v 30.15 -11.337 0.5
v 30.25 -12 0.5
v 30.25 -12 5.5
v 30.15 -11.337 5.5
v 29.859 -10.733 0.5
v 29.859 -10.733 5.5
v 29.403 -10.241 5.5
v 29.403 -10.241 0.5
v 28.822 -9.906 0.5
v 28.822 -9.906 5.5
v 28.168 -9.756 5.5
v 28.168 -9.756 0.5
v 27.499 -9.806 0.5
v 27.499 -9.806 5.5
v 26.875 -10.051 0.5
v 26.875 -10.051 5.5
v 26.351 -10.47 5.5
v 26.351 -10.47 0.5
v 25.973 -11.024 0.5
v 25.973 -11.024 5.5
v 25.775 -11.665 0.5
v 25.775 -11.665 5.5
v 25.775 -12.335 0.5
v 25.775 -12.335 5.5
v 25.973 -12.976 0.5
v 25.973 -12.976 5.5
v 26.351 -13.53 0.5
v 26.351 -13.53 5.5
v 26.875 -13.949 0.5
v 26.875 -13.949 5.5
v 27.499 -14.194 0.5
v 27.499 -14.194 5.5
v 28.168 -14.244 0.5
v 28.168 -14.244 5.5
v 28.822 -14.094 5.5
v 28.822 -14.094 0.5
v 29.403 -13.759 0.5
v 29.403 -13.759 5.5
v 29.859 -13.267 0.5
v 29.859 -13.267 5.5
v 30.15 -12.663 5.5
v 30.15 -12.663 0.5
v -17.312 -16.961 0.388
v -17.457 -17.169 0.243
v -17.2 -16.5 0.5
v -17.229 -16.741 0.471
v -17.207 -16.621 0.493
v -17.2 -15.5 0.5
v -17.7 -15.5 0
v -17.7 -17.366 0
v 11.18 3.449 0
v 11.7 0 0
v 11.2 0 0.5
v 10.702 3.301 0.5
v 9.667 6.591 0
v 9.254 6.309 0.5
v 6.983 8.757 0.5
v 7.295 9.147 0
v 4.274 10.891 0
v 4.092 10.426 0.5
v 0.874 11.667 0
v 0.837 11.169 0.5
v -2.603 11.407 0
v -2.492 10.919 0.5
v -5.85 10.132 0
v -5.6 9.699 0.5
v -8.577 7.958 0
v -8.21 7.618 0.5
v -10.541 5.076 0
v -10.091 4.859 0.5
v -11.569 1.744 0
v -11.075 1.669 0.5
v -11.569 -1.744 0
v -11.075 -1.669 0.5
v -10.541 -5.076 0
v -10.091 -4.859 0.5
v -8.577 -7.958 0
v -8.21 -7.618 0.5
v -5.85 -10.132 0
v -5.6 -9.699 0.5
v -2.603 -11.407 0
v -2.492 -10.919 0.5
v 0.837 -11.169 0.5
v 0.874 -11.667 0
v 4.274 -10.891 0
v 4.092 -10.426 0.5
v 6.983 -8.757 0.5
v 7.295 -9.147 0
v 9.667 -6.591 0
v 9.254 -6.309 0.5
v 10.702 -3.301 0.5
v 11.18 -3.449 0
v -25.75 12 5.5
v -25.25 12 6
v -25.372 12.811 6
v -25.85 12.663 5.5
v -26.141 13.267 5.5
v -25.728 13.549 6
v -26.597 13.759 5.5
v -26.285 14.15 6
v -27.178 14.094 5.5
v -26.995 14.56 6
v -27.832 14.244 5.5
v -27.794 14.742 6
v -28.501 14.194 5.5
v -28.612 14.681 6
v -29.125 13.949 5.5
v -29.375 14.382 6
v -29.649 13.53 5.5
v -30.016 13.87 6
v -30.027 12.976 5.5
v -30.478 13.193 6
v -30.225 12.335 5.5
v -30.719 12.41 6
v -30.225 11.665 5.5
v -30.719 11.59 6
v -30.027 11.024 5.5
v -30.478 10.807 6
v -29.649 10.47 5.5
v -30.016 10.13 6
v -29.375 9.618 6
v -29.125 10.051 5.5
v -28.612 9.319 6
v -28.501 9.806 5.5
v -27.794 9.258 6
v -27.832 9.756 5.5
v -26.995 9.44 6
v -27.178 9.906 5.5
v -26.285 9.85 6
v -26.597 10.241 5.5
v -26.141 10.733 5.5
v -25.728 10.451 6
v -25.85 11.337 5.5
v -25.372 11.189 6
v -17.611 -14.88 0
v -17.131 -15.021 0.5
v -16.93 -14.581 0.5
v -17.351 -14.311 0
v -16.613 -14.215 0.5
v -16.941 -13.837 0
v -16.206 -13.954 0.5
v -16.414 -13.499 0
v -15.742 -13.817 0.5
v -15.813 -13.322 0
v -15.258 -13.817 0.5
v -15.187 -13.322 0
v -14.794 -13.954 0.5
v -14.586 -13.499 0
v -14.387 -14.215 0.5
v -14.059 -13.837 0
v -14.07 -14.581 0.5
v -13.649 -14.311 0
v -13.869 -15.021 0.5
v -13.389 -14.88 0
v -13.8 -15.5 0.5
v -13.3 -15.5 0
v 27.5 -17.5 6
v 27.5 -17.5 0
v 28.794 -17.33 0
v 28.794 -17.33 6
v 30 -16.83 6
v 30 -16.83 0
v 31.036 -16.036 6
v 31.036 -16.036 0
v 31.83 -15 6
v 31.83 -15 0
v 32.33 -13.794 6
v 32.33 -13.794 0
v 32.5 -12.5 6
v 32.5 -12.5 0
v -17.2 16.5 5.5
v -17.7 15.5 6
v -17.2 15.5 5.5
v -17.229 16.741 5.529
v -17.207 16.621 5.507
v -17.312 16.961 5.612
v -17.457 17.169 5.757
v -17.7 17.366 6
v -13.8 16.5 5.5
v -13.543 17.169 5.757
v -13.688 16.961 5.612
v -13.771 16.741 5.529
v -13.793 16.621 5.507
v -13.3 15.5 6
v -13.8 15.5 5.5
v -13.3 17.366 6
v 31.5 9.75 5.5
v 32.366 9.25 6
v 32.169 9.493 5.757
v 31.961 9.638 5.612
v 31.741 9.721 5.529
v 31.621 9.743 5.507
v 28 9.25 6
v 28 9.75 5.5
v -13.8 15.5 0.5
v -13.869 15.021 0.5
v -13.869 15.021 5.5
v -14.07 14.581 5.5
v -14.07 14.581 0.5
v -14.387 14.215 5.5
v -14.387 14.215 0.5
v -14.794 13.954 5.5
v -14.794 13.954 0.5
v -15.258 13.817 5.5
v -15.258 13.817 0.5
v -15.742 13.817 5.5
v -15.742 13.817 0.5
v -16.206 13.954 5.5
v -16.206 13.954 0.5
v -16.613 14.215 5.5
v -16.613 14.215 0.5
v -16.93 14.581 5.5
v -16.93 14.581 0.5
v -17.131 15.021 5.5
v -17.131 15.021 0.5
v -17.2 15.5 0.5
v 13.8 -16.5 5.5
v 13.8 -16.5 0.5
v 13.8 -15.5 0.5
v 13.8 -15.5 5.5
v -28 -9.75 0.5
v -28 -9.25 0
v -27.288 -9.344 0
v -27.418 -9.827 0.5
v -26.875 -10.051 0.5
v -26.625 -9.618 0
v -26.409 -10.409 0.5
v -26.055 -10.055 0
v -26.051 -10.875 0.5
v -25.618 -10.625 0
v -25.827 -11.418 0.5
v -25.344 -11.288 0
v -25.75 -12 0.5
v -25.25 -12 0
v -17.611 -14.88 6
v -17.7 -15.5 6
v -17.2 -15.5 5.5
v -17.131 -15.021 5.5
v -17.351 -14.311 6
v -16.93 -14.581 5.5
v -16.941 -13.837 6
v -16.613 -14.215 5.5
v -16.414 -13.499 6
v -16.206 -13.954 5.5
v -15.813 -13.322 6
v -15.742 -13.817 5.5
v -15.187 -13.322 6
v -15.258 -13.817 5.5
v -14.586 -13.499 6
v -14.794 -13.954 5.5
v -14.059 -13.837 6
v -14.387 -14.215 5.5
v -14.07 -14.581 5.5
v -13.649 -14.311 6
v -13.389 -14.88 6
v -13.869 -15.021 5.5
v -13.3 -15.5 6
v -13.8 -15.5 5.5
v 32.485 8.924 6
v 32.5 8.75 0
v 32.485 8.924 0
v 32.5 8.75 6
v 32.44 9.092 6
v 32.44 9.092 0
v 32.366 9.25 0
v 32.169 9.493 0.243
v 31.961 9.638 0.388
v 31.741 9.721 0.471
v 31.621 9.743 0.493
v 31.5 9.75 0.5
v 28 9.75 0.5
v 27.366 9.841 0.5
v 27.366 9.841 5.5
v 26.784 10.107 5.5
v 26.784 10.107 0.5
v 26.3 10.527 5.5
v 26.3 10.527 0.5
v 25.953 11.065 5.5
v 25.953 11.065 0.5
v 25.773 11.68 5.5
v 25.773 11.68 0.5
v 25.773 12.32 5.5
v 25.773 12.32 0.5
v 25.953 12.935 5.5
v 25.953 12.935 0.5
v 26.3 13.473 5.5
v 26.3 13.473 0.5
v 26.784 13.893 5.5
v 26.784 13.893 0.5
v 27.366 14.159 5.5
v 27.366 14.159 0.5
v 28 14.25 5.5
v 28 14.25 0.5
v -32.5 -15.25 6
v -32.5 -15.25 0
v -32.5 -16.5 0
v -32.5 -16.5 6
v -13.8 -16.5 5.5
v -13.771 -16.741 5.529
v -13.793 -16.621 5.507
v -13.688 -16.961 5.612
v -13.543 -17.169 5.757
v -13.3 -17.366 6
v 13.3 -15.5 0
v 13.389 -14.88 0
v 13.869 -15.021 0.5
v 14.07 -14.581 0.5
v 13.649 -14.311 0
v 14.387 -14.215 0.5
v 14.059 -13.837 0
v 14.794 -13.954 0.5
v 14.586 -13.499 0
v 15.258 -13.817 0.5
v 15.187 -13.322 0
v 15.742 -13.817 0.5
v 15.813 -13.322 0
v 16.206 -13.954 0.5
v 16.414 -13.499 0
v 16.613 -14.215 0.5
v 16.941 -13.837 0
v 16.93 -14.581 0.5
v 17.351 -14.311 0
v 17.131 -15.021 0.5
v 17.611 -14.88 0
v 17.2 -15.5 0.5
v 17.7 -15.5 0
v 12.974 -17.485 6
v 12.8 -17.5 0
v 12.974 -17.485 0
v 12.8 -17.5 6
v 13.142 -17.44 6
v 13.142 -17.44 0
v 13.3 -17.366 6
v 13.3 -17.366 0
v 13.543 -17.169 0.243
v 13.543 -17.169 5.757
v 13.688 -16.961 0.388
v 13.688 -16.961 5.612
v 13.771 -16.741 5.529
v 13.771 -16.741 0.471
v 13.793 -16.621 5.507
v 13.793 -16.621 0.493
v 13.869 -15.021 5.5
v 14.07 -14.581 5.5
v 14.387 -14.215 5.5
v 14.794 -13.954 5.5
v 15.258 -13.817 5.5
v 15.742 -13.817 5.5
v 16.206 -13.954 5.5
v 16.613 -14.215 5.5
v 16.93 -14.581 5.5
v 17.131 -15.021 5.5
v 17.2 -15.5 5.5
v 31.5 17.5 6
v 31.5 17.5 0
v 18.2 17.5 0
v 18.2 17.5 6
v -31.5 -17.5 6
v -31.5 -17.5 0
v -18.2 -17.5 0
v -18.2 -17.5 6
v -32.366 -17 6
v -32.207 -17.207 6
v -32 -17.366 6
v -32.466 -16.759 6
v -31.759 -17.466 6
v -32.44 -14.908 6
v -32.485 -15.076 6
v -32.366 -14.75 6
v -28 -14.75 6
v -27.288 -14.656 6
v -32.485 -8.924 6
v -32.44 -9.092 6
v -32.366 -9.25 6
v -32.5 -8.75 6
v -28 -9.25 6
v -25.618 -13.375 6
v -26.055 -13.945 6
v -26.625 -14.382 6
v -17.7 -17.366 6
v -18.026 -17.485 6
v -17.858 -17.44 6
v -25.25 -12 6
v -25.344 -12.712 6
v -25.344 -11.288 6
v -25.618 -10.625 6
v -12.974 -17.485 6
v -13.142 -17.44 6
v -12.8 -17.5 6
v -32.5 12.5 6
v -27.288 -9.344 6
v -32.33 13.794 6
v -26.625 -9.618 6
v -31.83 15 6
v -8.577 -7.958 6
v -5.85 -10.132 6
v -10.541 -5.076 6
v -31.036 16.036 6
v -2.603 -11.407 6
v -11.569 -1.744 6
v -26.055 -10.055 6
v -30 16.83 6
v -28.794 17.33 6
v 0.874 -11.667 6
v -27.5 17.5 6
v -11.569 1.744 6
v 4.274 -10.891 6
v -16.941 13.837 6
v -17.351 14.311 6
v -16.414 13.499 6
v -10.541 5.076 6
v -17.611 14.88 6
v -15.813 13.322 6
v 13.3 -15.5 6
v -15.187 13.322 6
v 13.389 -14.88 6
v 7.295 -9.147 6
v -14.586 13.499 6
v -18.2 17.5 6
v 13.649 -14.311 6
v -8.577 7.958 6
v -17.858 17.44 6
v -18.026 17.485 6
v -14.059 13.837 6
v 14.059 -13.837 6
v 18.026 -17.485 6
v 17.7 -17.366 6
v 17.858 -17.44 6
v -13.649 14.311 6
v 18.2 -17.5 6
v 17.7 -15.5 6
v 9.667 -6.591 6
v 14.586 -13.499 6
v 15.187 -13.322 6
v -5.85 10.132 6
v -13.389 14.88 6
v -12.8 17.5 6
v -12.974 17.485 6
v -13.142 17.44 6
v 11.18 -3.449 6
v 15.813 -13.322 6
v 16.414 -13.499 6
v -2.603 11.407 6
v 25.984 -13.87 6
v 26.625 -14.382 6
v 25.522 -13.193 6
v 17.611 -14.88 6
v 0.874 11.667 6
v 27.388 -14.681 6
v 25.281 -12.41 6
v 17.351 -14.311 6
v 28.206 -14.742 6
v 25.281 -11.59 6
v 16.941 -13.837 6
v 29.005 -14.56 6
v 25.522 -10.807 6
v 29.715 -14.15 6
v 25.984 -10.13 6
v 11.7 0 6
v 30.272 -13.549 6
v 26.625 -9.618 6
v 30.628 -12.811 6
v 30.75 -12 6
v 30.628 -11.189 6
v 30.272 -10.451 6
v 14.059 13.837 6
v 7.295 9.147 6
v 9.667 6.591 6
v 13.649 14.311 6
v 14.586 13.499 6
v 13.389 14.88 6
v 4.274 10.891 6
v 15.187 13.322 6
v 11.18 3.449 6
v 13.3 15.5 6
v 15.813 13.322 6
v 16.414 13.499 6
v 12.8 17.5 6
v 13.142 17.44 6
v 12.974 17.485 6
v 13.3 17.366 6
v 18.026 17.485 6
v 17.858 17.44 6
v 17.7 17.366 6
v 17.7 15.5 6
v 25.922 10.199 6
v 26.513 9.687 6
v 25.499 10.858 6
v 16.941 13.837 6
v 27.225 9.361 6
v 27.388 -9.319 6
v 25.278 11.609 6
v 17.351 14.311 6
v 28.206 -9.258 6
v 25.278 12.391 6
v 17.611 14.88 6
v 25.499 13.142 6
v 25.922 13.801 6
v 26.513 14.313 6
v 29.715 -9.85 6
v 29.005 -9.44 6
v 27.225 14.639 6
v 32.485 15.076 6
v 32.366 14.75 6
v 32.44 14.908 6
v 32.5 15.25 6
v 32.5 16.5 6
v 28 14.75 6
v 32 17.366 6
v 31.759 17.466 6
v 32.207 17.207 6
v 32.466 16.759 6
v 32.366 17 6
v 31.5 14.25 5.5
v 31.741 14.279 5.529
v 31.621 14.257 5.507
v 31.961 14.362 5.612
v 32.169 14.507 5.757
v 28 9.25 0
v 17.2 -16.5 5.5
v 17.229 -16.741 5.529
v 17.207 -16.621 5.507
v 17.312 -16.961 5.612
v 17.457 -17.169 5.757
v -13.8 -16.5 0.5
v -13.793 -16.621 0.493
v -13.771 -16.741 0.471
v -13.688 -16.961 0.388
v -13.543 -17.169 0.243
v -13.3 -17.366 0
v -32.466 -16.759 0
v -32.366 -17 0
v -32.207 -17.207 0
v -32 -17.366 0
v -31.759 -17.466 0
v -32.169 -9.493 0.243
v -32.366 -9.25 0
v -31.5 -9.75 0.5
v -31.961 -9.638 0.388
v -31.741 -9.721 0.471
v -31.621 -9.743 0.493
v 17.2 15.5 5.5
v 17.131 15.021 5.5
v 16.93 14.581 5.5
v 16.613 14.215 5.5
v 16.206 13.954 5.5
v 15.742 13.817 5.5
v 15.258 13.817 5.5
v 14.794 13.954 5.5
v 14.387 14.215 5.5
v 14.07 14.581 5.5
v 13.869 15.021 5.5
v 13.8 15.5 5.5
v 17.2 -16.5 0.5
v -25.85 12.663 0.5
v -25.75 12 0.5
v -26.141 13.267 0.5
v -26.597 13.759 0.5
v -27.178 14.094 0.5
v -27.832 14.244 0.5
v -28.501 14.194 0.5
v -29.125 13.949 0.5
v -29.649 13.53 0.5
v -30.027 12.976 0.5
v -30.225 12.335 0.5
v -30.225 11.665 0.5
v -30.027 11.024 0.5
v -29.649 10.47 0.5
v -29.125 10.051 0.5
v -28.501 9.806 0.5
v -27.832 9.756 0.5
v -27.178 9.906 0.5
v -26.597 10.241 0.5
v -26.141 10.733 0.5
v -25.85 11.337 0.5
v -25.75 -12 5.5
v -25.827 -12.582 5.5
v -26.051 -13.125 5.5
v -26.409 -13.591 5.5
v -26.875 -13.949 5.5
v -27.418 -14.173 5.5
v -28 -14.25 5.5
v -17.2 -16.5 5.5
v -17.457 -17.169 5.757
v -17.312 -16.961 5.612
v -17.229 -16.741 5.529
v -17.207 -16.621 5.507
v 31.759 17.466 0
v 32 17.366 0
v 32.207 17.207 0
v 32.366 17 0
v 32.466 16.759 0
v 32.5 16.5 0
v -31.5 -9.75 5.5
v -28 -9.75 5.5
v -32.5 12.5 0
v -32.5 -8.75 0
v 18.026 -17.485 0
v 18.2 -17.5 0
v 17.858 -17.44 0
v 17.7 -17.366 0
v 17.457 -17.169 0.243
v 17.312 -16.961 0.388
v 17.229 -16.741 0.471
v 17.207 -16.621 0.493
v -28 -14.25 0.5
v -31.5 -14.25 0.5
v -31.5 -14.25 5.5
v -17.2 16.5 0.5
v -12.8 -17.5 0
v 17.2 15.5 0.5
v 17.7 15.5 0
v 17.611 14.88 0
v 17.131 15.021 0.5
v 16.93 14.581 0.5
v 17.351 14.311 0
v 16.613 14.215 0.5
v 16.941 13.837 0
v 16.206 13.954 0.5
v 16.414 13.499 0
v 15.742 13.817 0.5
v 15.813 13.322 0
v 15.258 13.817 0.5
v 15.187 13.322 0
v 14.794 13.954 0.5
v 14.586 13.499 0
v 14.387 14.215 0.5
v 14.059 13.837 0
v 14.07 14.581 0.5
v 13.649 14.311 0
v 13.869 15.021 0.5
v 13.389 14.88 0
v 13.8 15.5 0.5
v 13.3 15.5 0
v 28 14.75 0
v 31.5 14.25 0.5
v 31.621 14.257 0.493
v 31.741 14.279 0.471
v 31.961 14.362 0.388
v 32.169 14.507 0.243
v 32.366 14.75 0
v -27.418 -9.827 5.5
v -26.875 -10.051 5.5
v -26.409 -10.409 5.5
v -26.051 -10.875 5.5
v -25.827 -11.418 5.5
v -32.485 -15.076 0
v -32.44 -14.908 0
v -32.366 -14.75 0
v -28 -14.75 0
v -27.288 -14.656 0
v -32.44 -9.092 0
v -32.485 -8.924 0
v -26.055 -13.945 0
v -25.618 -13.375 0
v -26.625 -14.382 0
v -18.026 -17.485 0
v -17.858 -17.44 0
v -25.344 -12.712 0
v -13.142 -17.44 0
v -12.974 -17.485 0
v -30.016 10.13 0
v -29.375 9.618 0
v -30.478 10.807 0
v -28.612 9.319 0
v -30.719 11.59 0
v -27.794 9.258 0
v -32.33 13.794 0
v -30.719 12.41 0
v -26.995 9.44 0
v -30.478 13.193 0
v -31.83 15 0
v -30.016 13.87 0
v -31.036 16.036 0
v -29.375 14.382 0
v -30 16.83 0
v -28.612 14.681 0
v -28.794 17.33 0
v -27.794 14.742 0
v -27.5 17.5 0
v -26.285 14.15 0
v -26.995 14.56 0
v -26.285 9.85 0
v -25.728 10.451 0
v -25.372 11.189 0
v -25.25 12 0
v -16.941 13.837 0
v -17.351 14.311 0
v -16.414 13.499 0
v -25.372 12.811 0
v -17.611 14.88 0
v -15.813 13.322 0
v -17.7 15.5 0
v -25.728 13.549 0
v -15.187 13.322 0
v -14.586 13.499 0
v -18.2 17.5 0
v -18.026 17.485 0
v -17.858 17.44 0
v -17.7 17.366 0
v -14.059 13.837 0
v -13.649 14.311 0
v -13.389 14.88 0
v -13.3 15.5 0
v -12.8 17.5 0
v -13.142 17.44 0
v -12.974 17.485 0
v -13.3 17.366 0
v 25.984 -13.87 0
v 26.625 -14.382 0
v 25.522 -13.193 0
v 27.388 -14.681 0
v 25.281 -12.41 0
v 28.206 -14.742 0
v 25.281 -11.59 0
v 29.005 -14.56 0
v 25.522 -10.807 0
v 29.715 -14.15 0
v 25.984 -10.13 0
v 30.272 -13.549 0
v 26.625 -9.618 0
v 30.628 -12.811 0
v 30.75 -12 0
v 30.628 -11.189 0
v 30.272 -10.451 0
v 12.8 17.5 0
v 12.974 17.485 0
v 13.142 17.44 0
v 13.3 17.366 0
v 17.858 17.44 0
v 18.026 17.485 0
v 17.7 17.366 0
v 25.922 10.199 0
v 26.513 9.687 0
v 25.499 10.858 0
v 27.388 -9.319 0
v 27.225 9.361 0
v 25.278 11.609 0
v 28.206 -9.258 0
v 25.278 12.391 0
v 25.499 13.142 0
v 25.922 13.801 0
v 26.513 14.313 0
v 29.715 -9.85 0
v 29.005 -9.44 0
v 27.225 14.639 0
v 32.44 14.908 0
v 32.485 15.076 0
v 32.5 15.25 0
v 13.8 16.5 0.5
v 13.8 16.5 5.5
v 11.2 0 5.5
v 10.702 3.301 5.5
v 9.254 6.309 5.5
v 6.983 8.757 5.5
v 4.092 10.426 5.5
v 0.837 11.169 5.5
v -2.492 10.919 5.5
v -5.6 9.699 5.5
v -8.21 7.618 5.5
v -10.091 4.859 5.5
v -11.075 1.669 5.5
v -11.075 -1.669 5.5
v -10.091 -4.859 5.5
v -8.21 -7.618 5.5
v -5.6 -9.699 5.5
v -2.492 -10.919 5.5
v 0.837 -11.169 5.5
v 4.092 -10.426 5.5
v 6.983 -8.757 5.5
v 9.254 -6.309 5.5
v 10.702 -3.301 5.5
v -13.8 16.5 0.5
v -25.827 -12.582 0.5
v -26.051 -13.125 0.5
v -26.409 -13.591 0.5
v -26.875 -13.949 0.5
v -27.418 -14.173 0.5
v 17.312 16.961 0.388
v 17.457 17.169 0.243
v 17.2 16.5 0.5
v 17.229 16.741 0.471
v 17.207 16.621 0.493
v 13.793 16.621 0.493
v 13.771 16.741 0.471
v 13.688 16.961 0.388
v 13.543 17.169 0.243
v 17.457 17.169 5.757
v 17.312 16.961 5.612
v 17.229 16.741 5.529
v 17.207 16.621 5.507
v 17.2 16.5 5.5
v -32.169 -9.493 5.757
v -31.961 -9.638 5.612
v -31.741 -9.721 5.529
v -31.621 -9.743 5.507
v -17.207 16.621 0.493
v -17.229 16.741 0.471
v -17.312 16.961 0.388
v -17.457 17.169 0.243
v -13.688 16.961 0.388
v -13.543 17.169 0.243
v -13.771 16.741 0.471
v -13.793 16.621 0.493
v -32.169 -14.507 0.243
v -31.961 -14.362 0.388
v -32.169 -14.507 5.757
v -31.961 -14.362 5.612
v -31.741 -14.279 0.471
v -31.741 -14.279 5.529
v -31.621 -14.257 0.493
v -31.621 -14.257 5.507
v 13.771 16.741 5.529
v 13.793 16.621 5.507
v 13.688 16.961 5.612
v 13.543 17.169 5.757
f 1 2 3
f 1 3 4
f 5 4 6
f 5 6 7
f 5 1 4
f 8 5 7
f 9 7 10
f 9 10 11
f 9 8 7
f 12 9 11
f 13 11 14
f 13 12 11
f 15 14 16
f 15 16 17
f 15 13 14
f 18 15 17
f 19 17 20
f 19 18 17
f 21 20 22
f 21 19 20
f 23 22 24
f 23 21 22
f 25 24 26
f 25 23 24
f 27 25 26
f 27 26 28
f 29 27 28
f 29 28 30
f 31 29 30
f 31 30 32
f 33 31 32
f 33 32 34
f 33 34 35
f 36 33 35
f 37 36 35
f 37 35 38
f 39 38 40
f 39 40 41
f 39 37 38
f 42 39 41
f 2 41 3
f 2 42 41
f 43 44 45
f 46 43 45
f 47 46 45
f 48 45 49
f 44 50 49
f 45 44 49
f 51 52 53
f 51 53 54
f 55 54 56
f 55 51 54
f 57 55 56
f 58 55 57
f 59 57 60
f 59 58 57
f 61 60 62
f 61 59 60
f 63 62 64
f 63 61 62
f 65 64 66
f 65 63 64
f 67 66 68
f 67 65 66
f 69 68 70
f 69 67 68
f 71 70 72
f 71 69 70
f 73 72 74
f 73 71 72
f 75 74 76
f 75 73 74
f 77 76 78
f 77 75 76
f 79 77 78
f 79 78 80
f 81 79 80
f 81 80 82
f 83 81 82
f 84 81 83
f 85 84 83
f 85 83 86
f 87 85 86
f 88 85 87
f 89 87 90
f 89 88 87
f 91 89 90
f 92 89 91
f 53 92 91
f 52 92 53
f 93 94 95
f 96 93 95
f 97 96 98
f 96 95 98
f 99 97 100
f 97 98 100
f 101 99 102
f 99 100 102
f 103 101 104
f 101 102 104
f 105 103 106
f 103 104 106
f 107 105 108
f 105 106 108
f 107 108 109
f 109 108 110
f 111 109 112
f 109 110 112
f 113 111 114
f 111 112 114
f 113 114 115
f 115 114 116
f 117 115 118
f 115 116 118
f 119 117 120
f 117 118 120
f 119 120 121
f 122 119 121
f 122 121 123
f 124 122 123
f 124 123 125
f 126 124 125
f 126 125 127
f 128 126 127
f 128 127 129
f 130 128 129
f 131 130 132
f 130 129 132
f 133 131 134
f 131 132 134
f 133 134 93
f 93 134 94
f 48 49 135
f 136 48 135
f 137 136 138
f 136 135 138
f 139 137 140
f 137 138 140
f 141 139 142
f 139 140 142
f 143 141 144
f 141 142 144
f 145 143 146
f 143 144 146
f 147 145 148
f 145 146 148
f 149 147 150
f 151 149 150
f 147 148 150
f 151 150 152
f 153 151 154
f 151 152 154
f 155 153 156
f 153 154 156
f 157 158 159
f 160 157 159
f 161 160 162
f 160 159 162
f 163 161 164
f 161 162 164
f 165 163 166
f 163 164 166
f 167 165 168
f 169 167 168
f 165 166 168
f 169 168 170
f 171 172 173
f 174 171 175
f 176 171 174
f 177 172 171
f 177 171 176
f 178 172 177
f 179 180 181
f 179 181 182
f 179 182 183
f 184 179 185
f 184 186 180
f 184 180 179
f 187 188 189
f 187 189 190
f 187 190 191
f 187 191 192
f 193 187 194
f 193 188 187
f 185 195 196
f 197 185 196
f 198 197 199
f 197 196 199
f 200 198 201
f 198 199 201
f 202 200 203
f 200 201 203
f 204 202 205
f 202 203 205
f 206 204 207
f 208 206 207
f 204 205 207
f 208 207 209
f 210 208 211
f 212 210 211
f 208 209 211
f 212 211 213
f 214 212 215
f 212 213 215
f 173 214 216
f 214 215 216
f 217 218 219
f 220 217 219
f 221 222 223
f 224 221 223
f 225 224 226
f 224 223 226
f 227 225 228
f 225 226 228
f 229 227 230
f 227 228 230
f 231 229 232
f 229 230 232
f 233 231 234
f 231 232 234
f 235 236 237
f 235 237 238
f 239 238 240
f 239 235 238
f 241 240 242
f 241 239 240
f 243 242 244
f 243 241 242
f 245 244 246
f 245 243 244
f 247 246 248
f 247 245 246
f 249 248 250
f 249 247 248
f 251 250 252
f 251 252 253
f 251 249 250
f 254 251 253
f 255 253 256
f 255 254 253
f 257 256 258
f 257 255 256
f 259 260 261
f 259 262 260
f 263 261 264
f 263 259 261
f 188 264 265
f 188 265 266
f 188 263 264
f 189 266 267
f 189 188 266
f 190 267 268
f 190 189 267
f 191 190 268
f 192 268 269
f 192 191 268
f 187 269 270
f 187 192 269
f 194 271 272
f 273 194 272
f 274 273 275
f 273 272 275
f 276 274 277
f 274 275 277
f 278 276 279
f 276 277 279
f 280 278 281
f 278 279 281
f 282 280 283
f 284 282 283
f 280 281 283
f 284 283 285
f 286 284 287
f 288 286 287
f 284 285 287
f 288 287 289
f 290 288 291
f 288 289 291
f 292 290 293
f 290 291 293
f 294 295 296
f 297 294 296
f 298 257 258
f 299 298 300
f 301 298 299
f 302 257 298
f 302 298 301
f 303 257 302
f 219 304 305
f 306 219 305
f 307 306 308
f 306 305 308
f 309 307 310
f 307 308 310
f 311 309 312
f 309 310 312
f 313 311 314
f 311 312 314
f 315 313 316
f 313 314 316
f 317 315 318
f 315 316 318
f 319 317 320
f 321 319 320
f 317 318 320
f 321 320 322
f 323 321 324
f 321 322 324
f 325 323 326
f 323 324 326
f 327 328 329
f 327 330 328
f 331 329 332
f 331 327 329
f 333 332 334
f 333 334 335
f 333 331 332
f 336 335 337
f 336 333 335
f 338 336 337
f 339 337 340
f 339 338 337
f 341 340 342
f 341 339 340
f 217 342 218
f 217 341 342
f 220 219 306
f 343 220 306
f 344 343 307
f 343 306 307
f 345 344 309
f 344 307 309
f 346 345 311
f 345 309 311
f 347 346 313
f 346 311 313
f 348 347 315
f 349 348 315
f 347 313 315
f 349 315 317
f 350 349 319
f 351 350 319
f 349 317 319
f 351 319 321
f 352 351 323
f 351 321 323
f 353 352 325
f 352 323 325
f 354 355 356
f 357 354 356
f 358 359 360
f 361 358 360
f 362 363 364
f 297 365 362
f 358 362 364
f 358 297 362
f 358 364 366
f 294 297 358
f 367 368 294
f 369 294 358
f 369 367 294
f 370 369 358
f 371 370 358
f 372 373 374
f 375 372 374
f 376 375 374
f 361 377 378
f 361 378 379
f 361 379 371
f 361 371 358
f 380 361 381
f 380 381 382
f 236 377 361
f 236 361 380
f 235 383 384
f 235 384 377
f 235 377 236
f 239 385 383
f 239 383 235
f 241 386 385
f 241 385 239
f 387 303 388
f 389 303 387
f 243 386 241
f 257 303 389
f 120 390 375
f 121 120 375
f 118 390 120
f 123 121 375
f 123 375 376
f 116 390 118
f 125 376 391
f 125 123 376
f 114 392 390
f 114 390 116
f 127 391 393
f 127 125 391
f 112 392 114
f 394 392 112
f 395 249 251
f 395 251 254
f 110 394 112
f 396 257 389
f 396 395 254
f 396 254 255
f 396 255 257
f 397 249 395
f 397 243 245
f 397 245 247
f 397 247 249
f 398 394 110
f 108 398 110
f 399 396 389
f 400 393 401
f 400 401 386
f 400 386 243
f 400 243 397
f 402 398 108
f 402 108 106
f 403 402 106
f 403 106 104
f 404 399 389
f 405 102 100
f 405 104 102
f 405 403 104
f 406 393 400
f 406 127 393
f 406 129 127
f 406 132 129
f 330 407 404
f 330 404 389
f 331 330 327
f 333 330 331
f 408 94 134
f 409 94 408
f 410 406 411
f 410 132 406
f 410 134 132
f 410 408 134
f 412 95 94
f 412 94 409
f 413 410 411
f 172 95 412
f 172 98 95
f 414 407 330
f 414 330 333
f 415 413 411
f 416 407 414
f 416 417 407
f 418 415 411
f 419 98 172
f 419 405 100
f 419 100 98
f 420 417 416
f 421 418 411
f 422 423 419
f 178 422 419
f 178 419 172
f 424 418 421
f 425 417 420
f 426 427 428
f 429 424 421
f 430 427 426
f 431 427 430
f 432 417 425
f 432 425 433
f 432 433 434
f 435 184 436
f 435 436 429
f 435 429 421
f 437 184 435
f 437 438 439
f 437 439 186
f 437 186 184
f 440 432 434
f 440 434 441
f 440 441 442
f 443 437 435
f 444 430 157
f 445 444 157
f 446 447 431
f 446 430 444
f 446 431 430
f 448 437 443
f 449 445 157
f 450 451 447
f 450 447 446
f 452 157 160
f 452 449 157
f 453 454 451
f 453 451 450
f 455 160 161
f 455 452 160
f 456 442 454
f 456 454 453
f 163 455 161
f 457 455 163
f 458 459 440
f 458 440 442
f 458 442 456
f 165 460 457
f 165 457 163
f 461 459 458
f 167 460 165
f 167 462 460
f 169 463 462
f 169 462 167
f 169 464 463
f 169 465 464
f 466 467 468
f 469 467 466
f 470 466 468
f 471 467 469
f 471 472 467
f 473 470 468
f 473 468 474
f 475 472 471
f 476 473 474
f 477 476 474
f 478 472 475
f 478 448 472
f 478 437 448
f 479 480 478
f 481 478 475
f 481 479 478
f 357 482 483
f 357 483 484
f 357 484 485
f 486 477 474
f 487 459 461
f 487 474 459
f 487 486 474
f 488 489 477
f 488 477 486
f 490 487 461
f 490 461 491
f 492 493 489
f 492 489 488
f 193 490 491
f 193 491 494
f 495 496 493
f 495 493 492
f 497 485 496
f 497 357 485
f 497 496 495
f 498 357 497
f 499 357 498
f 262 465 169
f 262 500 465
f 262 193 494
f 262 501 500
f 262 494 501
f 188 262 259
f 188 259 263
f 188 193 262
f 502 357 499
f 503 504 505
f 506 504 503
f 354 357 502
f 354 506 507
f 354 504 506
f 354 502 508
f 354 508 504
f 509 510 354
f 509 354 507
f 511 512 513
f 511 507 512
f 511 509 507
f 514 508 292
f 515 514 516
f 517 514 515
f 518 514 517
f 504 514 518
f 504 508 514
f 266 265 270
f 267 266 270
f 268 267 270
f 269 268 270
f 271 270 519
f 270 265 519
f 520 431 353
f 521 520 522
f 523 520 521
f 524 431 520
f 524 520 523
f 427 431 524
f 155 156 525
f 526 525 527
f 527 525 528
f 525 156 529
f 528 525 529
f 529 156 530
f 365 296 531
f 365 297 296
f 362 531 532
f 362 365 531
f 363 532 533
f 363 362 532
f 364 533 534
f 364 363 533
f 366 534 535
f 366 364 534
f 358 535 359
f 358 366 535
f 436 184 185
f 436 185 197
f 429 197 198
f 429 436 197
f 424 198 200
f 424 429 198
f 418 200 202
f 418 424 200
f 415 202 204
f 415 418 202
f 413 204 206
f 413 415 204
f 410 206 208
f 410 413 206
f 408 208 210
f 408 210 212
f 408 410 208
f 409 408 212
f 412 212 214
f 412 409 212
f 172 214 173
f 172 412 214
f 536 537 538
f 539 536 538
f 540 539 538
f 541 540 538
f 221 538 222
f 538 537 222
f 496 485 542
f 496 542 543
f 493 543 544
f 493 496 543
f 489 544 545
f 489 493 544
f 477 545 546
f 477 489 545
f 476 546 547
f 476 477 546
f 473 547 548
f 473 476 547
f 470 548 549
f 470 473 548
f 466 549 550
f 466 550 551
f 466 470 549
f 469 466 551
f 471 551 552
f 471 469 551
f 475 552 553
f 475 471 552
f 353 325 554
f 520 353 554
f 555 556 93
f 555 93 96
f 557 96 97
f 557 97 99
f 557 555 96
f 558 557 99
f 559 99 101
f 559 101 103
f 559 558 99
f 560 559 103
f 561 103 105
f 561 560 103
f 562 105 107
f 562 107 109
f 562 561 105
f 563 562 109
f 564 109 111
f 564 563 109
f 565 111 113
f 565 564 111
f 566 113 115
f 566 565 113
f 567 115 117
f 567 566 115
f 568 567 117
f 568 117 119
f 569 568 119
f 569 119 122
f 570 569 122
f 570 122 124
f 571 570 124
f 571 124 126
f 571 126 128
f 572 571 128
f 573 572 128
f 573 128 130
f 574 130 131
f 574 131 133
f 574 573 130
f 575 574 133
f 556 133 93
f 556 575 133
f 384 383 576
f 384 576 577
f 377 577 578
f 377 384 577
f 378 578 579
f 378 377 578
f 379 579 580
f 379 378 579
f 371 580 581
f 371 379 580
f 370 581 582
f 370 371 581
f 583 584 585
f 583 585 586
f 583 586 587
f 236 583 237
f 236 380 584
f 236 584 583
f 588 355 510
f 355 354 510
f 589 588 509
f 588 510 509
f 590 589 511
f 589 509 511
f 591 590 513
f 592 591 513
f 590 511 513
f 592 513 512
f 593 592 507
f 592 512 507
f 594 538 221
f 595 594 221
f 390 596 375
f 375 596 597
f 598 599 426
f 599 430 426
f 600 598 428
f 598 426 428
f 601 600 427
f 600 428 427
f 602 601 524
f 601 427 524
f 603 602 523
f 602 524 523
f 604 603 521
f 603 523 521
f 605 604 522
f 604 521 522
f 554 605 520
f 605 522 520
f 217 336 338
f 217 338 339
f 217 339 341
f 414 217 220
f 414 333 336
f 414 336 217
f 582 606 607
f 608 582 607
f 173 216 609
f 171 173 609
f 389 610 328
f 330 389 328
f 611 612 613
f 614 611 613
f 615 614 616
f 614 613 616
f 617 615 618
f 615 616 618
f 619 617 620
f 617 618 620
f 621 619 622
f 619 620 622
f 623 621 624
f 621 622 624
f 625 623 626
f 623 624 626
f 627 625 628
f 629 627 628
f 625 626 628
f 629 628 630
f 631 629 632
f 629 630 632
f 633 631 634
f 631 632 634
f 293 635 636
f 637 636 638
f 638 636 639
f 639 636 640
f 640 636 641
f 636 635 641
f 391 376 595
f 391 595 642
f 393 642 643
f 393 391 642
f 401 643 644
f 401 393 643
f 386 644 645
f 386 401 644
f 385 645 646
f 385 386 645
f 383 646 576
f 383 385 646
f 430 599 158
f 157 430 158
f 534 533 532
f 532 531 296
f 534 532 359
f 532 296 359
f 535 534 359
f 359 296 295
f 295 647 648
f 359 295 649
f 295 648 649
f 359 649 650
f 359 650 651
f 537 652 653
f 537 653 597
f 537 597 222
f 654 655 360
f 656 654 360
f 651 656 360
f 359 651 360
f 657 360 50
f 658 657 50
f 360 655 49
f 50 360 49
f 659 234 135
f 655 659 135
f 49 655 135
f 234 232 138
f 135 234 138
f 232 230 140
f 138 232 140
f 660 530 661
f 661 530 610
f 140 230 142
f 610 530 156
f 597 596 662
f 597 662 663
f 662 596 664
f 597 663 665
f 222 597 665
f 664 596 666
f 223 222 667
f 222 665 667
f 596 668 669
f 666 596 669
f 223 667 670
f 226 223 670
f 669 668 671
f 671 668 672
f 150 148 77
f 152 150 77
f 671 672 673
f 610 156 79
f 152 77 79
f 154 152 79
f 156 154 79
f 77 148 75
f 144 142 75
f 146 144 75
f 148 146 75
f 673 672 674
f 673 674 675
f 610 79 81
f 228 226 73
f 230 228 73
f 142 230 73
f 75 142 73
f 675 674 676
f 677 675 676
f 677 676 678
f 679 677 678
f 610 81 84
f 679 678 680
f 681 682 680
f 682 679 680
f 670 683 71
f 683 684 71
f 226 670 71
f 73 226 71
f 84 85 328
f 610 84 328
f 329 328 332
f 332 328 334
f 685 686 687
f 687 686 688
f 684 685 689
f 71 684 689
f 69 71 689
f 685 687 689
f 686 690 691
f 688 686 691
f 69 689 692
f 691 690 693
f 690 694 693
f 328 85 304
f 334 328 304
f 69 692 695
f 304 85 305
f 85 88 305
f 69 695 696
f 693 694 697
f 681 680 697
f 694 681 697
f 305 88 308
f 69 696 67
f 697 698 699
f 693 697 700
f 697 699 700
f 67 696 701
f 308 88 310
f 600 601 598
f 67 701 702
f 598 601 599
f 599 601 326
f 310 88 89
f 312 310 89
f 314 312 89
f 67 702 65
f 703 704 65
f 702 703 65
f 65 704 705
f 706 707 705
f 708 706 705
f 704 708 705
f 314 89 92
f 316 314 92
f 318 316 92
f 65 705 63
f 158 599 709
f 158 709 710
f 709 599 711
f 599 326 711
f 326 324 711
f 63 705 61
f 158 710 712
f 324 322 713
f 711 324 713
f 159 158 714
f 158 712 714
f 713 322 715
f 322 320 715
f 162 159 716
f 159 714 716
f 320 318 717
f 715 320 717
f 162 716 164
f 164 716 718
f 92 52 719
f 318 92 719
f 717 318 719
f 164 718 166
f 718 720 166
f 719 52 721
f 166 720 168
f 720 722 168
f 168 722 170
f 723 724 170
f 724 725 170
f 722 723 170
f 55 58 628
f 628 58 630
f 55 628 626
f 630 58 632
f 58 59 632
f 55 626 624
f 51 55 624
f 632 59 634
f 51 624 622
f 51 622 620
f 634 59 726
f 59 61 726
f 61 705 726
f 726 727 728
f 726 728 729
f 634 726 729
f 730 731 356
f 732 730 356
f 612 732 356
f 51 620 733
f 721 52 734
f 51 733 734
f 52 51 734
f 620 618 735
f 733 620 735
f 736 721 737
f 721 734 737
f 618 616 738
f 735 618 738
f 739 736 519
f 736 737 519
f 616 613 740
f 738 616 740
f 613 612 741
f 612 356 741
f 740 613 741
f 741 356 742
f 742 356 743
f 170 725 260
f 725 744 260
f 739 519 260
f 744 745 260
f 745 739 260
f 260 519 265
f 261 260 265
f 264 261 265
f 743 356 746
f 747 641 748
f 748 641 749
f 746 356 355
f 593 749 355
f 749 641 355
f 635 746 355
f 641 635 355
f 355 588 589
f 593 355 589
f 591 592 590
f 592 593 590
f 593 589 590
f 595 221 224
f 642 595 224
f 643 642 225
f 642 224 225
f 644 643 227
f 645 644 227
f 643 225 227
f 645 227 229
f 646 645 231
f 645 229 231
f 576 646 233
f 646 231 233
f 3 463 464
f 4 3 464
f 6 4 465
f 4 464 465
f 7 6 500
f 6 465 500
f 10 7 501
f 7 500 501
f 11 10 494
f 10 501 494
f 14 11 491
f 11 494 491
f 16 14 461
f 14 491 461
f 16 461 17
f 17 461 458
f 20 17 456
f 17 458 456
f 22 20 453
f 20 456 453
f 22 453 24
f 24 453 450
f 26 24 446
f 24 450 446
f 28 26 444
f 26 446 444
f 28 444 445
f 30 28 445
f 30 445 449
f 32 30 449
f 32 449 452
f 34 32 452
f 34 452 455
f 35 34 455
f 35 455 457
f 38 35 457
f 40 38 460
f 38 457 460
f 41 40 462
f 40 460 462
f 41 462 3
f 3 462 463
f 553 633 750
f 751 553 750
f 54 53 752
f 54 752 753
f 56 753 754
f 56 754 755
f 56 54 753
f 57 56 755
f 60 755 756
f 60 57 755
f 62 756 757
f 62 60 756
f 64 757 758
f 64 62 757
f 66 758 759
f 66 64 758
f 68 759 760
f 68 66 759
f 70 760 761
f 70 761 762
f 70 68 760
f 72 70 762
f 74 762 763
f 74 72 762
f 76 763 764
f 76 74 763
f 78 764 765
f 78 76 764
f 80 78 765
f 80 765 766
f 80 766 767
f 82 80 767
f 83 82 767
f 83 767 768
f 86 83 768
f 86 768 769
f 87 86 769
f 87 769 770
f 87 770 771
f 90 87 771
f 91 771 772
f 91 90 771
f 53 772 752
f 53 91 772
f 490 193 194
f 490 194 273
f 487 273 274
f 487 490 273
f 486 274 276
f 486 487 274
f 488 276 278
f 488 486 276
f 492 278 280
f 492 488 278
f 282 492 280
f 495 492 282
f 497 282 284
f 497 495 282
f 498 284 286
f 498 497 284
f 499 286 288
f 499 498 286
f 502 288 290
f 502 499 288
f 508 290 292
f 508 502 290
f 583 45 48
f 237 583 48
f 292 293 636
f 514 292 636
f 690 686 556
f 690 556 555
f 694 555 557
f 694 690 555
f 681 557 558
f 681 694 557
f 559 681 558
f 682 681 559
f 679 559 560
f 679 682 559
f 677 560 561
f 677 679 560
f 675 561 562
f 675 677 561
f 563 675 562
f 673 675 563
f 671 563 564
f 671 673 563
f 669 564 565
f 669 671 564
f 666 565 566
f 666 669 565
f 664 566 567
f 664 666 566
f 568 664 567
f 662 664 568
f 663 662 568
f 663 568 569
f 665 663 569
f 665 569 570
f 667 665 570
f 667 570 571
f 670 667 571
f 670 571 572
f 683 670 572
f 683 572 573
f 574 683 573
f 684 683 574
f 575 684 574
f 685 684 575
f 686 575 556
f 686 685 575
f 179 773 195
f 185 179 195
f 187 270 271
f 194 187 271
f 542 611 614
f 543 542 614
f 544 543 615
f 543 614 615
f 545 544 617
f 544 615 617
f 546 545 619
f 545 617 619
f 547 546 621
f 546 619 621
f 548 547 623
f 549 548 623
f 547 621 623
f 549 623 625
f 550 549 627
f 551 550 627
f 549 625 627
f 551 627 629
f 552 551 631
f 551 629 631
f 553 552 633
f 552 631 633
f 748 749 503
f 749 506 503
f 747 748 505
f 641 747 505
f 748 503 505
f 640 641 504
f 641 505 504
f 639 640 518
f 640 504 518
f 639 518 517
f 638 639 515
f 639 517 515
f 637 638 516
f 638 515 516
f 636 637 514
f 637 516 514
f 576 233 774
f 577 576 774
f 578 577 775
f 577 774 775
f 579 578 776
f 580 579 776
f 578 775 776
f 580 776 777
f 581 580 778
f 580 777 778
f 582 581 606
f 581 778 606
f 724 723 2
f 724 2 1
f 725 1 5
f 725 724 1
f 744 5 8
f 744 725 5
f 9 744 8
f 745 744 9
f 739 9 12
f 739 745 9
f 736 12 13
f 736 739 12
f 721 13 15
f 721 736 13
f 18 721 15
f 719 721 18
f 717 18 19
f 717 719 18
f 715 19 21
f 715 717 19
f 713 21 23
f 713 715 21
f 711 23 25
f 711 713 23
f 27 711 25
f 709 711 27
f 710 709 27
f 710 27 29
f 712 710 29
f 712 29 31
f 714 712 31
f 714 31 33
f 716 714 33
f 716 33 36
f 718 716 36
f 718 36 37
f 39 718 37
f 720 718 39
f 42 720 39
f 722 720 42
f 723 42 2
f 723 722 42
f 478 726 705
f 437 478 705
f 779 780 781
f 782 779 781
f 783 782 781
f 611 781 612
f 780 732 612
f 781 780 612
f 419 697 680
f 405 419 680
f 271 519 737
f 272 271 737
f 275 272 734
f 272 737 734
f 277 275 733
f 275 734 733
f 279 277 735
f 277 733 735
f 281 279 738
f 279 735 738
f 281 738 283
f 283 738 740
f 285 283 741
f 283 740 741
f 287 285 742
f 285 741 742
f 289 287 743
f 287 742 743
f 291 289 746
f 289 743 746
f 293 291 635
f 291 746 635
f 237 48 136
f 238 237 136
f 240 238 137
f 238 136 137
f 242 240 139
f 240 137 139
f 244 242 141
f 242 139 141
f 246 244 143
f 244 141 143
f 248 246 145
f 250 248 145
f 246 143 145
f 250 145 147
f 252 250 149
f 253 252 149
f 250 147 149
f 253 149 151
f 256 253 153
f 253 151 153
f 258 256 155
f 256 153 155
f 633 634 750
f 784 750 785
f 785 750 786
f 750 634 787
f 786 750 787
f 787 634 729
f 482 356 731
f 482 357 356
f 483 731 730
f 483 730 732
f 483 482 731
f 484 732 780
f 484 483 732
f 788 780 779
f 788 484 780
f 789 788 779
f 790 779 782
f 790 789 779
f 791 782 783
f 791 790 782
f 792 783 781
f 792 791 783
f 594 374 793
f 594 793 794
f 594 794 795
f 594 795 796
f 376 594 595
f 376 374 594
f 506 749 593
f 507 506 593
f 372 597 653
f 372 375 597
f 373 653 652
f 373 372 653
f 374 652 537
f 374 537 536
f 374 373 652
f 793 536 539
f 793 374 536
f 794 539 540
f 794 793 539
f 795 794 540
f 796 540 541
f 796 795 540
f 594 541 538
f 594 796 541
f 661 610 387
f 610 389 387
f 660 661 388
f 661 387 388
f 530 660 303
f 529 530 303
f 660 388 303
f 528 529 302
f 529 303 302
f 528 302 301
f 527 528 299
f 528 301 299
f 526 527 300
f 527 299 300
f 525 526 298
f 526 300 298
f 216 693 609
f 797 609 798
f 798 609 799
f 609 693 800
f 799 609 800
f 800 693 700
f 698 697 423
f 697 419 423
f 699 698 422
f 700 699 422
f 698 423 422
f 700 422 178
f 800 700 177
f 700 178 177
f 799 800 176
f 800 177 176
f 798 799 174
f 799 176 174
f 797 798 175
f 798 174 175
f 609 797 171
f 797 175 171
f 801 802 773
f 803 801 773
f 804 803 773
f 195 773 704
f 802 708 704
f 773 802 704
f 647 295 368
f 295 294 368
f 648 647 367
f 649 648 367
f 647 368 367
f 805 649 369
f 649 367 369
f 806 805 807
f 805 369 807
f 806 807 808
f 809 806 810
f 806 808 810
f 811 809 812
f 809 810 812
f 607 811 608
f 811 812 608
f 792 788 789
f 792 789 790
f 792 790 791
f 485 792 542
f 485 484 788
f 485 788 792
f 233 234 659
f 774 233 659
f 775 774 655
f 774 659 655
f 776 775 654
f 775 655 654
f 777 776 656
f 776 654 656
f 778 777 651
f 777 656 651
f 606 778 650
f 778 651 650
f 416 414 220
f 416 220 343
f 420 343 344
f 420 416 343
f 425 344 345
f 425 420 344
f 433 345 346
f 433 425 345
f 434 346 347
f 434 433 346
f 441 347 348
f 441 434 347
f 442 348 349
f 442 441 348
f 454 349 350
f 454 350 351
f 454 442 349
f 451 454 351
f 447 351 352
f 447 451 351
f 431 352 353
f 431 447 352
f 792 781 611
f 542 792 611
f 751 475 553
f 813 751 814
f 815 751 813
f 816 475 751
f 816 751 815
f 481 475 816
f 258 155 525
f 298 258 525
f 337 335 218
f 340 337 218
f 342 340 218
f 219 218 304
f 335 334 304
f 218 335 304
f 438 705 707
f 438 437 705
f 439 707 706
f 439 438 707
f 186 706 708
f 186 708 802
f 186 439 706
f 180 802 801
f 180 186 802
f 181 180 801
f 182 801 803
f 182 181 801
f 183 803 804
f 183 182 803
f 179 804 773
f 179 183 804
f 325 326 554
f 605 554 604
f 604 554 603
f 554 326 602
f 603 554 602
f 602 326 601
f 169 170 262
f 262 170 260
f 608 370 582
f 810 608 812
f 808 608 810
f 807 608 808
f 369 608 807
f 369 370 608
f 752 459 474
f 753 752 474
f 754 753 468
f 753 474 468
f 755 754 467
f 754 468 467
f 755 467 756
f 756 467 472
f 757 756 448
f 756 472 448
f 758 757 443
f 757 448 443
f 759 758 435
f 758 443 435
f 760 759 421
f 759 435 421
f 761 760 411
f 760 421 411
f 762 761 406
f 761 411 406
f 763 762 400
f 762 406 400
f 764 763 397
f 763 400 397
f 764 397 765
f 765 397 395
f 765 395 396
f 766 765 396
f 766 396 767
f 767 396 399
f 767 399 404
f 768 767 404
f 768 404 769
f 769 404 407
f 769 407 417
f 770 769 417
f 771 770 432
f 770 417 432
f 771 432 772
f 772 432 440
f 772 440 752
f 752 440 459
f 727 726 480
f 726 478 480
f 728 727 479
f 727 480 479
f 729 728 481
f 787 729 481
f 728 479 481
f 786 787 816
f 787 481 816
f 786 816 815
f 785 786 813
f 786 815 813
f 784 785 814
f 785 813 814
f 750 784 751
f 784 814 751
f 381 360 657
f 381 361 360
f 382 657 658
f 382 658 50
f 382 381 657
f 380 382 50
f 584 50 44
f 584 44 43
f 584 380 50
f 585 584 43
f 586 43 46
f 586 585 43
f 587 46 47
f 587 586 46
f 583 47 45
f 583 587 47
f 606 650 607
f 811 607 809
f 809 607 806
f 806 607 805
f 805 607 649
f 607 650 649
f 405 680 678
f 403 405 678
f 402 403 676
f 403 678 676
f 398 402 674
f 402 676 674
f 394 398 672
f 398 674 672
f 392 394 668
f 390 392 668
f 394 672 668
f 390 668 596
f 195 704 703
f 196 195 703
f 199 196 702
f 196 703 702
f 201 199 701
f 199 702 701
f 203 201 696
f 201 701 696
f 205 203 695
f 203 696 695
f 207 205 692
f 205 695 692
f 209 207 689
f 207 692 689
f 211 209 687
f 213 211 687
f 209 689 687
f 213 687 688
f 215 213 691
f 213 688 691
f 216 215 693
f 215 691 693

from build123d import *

# Parameters (mm, degrees)
F0_R     = 2.25
F0_R_2   = 11.2
F1_DEPTH = 6
F2_SIZE  = 0.5
F3_R     = 1


with BuildPart() as f1:
    # F0 (on Top) → F1 (new body)
    with BuildSketch(Plane.XY):
        with BuildLine():
            Line((-17.2, 17.5), (-27.5, 17.5))
            ThreePointArc((-27.5, 17.5), (-31.0355339059, 16.0355339059), (-32.5, 12.5))
            Line((-32.5, 12.5), (-32.5, -9.75))
            Line((-32.5, -9.75), (-28, -9.75))
            ThreePointArc((-28, -9.75), (-26.4090097423, -10.4090097423), (-25.75, -12))
            ThreePointArc((-25.75, -12), (-26.4090097423, -13.5909902577), (-28, -14.25))
            Line((-28, -14.25), (-32.5, -14.25))
            Line((-32.5, -14.25), (-32.5, -17.5))
            Line((-32.5, -17.5), (-17.2, -17.5))
            Line((-17.2, -17.5), (-17.2, -15.5))
            ThreePointArc((-17.2, -15.5), (-15.5, -13.8), (-13.8, -15.5))
            Line((-13.8, -15.5), (-13.8, -17.5))
            Line((-13.8, -17.5), (13.8, -17.5))
            Line((13.8, -17.5), (13.8, -15.5))
            ThreePointArc((13.8, -15.5), (15.5, -13.8), (17.2, -15.5))
            Line((17.2, -15.5), (17.2, -17.5))
            Line((17.2, -17.5), (27.5, -17.5))
            ThreePointArc((27.5, -17.5), (31.0355339059, -16.0355339059), (32.5, -12.5))
            Line((32.5, -12.5), (32.5, 9.75))
            Line((32.5, 9.75), (28, 9.75))
            ThreePointArc((28, 9.75), (25.75, 12), (28, 14.25))
            Line((28, 14.25), (32.5, 14.25))
            Line((32.5, 14.25), (32.5, 17.5))
            Line((32.5, 17.5), (17.2, 17.5))
            Line((17.2, 17.5), (17.2, 15.5))
            ThreePointArc((17.2, 15.5), (15.5, 13.8), (13.8, 15.5))
            Line((13.8, 15.5), (13.8, 17.5))
            Line((13.8, 17.5), (-13.8, 17.5))
            Line((-13.8, 17.5), (-13.8, 15.5))
            ThreePointArc((-13.8, 15.5), (-15.5, 13.8), (-17.2, 15.5))
            Line((-17.2, 15.5), (-17.2, 17.5))
        make_face()
        with Locations((28, -12)):
            Circle(F0_R, mode=Mode.SUBTRACT)
        with Locations((-28, 12)):
            Circle(F0_R, mode=Mode.SUBTRACT)
        Circle(F0_R_2, mode=Mode.SUBTRACT)
    extrude(amount=F1_DEPTH)

    # F2
    f2_edges = [f1.edges().sort_by_distance(p)[0] for p in [
        (-11.2, 0, 6),
        (-11.2, 0, 0),
        (-25.75, -12, 0),
        (-15.5, -13.8, 0),
        (15.5, -13.8, 0),
        (25.75, -12, 0),
        (25.75, 12, 0),
        (15.5, 13.8, 0),
        (-15.5, 13.8, 0),
        (-30.25, 12, 0),
        (-30.25, 12, 6),
        (-15.5, 13.8, 6),
        (15.5, 13.8, 6),
        (25.75, 12, 6),
        (-25.75, -12, 6),
        (-15.5, -13.8, 6),
        (15.5, -13.8, 6),
        (25.75, -12, 6),
        (-13.8, 16.5, 6),
        (-17.2, 16.5, 6),
        (-30.25, -9.75, 6),
        (-30.25, -14.25, 6),
        (-17.2, -16.5, 6),
        (-13.8, -16.5, 6),
        (13.8, -16.5, 6),
        (17.2, -16.5, 6),
        (30.25, 9.75, 6),
        (30.25, 14.25, 6),
        (17.2, 16.5, 6),
        (13.8, 16.5, 6),
        (17.2, 16.5, 0),
        (30.25, 14.25, 0),
        (30.25, 9.75, 0),
        (17.2, -16.5, 0),
        (13.8, -16.5, 0),
        (-13.8, -16.5, 0),
        (-17.2, -16.5, 0),
        (-30.25, -14.25, 0),
        (-30.25, -9.75, 0),
        (-17.2, 16.5, 0),
        (-13.8, 16.5, 0),
        (13.8, 16.5, 0),
    ]]
    chamfer(f2_edges, length=F2_SIZE)

    # F3
    f3_edges = [f1.edges().sort_by_distance(p)[0] for p in [
        (-32.5, -14.25, 3),
        (-32.5, -9.75, 3),
        (-32.5, -17.5, 3),
        (-17.2, -17.5, 3),
        (-13.8, -17.5, 3),
        (13.8, -17.5, 3),
        (17.2, -17.5, 3),
        (32.5, 14.25, 3),
        (32.5, 9.75, 3),
        (32.5, 17.5, 3),
        (17.2, 17.5, 3),
        (13.8, 17.5, 3),
        (-13.8, 17.5, 3),
        (-17.2, 17.5, 3),
    ]]
    fillet(f3_edges, radius=F3_R)


solid = f1.part
